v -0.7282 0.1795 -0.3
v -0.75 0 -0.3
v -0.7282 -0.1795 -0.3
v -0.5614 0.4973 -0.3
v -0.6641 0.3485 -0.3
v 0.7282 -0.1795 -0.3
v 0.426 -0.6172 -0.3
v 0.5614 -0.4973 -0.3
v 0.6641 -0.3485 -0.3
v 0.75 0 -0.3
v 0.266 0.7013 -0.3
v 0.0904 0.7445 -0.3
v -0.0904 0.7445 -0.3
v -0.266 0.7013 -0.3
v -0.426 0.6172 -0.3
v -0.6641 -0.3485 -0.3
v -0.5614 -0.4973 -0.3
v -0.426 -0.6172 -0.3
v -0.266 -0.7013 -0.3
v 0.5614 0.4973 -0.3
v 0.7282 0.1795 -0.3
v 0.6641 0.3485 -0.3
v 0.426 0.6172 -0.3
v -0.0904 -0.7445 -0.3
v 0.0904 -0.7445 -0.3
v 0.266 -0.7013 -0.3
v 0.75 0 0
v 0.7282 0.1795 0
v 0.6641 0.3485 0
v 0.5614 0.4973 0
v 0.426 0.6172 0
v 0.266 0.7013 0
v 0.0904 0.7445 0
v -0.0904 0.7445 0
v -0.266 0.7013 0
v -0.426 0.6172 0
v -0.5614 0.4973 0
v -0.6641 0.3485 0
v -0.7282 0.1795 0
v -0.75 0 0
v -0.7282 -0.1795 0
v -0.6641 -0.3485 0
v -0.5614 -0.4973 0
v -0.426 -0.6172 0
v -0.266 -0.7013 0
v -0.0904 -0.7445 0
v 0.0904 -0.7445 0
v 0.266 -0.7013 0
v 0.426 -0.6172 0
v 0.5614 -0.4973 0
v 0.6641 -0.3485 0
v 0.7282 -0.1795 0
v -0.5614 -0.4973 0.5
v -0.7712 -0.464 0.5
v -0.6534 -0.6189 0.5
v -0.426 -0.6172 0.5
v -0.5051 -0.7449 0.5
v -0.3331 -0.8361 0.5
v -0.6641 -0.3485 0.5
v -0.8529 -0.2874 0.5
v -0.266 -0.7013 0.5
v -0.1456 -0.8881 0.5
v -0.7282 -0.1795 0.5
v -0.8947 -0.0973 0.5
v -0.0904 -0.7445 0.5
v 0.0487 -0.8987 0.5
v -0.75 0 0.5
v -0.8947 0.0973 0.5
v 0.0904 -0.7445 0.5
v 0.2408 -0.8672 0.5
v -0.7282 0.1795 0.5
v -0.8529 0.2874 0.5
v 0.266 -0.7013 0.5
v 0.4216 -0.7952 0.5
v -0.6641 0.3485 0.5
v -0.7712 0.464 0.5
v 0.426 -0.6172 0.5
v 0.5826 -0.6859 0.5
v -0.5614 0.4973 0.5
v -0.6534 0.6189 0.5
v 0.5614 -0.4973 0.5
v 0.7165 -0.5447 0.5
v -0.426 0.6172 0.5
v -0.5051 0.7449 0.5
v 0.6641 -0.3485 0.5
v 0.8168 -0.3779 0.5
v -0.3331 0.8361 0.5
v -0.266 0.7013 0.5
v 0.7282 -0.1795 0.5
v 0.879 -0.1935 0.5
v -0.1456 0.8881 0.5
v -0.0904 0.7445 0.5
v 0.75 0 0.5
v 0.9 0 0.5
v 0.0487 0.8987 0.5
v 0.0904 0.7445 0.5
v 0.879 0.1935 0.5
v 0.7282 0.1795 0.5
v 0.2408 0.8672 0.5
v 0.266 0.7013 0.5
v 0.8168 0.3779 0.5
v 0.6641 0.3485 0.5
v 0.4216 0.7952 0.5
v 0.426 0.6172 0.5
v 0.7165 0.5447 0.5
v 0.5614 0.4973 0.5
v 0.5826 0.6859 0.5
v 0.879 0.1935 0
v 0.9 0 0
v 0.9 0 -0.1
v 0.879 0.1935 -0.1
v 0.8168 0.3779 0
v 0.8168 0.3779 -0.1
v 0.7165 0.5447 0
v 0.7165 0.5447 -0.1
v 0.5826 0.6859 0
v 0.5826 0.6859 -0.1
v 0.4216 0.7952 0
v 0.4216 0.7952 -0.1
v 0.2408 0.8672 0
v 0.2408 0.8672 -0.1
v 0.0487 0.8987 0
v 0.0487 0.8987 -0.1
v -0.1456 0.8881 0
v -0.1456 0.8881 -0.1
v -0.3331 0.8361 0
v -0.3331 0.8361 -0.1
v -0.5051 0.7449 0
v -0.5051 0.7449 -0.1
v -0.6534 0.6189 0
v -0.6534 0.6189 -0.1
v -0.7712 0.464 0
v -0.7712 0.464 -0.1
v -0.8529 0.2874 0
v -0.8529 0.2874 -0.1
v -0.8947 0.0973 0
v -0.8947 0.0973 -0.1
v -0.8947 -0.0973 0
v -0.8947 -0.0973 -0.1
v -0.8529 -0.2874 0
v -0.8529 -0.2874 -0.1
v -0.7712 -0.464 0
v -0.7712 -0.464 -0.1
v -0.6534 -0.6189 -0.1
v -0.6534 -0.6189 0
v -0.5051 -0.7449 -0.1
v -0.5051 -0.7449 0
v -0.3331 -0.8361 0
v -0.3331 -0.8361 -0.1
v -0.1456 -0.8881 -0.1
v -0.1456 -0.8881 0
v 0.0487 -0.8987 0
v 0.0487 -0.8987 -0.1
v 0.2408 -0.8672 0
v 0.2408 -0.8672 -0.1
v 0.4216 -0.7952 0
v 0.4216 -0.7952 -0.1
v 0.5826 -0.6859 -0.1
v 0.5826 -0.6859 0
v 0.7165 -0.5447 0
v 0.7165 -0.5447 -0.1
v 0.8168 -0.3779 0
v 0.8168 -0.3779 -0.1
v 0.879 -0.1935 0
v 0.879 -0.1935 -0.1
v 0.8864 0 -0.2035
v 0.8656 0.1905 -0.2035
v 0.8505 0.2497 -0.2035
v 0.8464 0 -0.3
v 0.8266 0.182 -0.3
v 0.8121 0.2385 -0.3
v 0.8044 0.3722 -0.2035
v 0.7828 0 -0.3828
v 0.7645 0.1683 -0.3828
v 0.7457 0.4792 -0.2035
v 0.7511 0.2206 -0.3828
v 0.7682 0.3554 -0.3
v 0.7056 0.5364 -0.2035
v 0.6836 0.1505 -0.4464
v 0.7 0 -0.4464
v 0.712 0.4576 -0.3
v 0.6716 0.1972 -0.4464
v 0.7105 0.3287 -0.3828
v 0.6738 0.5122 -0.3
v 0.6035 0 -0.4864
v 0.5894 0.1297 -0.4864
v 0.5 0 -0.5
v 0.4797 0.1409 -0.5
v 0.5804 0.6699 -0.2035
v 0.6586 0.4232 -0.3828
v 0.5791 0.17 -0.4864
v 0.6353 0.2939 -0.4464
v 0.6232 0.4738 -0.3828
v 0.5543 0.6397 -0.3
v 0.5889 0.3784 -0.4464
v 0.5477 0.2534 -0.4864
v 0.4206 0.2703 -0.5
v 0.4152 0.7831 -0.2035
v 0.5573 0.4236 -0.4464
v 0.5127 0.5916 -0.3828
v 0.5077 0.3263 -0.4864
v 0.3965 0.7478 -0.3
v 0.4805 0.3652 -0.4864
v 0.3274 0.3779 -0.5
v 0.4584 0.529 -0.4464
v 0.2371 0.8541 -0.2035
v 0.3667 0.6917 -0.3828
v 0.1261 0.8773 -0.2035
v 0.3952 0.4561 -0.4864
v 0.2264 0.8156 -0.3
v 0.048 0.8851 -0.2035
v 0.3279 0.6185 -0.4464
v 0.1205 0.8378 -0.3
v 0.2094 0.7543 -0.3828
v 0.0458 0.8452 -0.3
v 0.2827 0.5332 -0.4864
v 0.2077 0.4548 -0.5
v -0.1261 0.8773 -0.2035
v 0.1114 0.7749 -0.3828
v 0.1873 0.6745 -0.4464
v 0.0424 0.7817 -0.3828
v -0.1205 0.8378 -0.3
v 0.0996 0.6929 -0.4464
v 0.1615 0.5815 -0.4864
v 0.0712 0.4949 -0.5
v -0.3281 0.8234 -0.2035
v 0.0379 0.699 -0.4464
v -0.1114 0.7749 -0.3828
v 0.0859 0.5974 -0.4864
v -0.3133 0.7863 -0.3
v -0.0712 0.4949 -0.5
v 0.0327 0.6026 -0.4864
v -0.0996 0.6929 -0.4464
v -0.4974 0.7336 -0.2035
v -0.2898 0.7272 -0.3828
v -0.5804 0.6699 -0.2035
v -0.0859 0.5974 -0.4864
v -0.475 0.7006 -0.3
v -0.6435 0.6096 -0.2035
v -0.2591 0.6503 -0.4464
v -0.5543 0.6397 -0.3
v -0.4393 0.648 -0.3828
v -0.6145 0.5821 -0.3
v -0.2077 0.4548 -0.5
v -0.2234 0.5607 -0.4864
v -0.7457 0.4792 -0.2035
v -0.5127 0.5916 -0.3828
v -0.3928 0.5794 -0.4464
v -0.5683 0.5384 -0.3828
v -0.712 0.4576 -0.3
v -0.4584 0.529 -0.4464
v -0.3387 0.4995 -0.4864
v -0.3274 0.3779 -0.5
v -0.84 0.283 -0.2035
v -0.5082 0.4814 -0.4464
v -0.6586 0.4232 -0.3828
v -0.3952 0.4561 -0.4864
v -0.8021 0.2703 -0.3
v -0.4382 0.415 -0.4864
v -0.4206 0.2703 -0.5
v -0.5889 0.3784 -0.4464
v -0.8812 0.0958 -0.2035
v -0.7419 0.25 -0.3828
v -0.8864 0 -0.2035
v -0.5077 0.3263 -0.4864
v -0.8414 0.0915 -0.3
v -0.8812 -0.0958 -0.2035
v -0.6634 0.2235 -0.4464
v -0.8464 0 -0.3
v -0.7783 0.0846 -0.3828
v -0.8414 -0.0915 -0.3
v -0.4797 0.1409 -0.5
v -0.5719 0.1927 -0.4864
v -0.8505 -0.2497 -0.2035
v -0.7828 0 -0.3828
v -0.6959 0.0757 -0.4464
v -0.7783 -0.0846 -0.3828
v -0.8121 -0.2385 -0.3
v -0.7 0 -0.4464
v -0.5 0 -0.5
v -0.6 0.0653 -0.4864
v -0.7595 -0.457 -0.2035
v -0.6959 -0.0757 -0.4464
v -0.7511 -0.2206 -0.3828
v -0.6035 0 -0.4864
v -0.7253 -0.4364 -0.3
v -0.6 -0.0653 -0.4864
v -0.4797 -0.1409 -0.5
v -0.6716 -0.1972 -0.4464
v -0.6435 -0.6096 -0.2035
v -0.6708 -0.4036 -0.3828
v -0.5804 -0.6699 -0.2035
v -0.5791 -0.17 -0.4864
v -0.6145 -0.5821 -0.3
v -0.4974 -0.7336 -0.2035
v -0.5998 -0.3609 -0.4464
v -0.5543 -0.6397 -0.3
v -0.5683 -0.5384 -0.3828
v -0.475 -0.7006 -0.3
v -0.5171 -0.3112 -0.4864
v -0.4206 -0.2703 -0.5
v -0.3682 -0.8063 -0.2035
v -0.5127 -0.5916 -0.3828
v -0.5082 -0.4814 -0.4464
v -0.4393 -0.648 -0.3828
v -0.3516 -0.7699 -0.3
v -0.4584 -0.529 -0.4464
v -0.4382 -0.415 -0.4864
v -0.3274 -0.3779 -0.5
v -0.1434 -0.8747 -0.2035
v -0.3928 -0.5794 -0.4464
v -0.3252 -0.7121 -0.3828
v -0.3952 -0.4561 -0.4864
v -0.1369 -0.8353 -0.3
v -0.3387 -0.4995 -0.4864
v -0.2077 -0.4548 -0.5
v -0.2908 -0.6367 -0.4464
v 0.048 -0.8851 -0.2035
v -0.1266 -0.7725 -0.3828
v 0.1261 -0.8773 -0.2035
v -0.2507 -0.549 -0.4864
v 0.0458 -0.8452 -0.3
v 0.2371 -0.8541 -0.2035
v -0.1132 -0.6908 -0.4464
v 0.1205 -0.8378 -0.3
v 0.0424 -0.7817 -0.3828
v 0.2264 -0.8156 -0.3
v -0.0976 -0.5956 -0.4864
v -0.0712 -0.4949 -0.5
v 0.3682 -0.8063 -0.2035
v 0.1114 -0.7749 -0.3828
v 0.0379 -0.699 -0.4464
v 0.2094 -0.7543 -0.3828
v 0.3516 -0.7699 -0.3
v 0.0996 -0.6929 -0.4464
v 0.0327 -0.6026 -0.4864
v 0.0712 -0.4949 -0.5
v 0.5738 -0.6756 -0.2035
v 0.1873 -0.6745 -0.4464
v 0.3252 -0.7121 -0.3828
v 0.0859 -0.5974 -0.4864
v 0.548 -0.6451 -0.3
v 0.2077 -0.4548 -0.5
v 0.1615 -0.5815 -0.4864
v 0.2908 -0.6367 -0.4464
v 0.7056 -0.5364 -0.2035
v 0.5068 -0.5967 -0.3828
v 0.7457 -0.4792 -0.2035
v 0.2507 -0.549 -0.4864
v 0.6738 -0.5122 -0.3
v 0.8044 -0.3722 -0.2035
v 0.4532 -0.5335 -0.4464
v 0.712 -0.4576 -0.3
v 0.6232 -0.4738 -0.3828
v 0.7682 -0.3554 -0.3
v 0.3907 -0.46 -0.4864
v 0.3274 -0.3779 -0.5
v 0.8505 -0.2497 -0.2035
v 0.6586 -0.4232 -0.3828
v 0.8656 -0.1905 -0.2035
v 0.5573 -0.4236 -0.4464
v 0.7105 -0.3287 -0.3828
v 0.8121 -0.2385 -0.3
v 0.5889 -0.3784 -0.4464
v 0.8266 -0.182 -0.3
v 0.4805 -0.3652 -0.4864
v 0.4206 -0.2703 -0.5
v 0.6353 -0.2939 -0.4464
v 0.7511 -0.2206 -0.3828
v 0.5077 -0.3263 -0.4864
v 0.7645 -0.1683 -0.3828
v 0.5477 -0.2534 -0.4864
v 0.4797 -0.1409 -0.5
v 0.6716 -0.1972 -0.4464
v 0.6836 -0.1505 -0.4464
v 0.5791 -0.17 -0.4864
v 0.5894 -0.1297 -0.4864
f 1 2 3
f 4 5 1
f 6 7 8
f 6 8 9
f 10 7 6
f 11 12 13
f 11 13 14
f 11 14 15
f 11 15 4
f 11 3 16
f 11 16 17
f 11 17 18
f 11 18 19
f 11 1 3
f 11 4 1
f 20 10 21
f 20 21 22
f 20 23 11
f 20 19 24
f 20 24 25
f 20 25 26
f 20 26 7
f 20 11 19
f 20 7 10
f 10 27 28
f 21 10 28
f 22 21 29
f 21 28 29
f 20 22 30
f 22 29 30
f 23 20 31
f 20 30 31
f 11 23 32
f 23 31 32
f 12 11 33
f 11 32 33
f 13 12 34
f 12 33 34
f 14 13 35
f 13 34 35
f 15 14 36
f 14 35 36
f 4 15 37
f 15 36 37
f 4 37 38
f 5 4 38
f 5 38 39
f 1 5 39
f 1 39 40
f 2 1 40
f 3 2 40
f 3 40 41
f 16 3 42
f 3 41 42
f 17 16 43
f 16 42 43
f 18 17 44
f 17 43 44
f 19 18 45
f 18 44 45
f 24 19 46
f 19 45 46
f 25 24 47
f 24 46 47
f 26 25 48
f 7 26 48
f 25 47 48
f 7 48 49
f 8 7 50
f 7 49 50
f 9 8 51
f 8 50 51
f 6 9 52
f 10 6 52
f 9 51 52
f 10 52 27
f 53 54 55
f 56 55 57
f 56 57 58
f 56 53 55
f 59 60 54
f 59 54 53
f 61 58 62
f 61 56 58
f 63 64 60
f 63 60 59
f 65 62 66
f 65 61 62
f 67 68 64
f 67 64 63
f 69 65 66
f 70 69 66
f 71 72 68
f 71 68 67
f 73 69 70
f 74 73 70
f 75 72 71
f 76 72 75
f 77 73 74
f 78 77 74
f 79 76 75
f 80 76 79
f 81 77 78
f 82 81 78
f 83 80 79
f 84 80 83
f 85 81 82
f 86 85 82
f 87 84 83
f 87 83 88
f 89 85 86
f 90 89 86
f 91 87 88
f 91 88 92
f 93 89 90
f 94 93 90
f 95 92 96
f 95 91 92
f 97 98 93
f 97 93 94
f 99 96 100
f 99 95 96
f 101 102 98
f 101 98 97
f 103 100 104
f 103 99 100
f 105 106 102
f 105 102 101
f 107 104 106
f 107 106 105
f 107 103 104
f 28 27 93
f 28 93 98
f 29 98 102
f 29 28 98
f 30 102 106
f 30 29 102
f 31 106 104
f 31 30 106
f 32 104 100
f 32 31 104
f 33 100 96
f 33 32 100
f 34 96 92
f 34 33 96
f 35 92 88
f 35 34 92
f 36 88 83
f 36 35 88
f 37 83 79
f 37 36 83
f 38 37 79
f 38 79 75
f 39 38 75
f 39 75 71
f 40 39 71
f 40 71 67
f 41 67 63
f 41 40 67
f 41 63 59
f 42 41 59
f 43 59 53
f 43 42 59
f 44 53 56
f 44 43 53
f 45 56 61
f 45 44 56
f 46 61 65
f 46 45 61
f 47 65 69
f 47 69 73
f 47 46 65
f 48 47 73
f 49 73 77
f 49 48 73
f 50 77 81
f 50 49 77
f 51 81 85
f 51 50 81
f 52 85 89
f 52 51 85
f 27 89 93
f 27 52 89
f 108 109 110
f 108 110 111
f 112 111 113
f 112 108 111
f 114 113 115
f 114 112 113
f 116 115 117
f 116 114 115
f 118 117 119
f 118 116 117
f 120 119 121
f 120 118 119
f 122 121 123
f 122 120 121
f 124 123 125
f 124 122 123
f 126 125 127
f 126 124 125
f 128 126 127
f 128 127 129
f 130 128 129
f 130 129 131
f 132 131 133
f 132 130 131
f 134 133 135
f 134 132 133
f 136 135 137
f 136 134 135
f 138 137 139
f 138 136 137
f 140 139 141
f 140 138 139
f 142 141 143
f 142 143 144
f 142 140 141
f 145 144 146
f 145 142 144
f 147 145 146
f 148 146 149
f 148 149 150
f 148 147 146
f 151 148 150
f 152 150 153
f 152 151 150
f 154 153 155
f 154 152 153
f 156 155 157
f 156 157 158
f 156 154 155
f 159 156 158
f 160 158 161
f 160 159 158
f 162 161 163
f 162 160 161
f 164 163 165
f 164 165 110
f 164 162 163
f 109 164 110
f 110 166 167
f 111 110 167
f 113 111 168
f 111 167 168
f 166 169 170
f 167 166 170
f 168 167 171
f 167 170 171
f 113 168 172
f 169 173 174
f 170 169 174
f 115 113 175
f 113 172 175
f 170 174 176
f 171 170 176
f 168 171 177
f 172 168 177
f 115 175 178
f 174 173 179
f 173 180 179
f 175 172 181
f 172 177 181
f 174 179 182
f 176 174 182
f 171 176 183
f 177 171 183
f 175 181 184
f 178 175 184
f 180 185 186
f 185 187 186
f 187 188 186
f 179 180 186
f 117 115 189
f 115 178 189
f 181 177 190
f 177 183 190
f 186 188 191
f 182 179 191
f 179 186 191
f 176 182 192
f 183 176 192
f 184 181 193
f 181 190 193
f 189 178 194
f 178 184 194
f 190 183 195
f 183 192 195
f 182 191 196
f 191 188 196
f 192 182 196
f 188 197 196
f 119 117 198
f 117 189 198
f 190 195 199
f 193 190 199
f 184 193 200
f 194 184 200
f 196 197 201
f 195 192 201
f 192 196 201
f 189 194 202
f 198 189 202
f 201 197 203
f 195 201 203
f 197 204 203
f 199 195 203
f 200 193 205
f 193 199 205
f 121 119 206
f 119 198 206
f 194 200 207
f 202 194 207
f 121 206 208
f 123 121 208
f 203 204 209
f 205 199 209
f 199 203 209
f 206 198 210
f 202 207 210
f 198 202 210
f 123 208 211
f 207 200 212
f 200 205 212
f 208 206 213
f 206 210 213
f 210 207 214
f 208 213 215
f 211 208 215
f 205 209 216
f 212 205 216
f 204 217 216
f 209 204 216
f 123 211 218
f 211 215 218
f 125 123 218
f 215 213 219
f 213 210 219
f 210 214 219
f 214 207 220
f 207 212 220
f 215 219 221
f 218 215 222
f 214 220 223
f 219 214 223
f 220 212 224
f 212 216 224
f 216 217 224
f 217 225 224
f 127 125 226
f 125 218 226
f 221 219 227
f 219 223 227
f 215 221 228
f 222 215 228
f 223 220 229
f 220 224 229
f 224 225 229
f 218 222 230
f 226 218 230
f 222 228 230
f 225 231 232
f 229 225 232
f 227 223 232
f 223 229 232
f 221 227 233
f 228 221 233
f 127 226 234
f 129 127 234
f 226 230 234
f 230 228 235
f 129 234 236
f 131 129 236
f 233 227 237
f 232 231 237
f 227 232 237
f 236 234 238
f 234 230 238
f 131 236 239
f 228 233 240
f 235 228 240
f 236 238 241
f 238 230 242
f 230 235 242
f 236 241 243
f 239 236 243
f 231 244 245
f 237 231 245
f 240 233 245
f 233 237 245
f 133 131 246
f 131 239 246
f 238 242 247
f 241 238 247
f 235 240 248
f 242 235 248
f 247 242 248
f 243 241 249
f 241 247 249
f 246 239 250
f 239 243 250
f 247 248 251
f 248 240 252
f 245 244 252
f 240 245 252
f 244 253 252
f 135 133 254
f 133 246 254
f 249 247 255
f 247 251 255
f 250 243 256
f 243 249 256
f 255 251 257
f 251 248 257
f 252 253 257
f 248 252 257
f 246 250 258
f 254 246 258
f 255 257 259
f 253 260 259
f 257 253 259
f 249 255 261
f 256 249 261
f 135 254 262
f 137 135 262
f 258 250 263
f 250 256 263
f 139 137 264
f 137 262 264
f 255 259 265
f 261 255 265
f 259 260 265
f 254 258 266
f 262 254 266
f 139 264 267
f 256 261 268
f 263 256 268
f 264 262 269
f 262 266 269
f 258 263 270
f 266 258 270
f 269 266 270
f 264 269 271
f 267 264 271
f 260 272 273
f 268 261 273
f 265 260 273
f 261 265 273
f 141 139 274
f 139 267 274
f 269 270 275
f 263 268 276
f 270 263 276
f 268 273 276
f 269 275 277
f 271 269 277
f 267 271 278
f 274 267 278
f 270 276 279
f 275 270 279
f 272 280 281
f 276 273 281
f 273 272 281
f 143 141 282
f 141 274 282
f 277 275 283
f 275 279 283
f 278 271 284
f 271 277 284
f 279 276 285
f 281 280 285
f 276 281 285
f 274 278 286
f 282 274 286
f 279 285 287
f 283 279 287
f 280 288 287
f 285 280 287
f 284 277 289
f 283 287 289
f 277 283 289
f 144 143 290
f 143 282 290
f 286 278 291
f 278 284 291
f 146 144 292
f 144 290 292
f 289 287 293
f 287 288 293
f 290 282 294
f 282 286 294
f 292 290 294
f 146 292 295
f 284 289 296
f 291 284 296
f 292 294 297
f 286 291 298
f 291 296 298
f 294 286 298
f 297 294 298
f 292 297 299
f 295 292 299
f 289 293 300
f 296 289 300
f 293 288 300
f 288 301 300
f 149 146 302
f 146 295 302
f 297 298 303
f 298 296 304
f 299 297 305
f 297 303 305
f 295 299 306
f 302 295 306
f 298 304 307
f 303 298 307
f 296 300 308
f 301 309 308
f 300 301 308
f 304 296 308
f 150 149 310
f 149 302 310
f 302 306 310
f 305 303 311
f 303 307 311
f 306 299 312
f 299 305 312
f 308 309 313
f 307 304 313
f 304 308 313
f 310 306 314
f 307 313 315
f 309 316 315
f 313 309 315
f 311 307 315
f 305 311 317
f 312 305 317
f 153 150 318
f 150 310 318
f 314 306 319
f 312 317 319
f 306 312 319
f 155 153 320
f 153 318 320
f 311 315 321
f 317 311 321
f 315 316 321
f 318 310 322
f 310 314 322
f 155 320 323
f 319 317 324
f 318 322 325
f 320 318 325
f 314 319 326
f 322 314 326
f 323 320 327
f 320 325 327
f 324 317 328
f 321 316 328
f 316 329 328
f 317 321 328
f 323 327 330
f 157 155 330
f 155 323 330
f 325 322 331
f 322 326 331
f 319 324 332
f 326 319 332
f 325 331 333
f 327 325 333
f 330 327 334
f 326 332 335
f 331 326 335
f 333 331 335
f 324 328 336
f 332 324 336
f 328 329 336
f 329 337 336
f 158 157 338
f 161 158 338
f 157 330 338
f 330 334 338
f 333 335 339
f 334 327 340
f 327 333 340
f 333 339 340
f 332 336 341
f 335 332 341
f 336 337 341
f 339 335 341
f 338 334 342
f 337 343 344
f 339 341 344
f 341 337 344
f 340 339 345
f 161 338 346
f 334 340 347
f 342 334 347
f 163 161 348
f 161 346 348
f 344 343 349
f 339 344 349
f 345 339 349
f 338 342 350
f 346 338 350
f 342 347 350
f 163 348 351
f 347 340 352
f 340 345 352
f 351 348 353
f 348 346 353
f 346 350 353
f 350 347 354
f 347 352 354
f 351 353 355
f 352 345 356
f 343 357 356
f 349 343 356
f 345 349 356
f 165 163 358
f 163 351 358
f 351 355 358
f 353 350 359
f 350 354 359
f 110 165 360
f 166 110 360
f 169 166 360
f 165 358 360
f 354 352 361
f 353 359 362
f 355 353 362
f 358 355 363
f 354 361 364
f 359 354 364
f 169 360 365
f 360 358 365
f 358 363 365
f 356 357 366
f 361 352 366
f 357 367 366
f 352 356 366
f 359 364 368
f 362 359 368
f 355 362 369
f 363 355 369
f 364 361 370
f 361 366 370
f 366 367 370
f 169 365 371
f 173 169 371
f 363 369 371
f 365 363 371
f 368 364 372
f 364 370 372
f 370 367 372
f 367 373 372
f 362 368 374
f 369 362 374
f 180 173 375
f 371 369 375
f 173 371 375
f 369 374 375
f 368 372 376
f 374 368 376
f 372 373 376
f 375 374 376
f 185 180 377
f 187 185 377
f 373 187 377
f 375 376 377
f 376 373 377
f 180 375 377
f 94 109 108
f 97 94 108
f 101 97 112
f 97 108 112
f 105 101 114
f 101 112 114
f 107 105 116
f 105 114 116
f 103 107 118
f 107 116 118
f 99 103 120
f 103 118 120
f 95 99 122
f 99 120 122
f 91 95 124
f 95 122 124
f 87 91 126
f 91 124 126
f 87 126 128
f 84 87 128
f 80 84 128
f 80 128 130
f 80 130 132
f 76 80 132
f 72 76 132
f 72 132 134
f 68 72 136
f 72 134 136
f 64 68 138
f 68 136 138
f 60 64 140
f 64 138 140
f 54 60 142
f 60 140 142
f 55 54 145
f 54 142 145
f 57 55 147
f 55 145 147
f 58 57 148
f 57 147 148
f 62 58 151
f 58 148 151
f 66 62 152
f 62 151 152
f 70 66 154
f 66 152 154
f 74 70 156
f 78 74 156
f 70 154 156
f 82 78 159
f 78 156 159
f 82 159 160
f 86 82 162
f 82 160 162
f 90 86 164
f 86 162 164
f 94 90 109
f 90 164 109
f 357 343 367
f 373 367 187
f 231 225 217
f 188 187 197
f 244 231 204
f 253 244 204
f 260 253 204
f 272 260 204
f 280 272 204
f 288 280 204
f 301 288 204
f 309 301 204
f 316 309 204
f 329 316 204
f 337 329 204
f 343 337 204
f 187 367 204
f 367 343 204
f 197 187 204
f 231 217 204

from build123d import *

# Parameters (mm, degrees)
SKETCH1_R           = 0.9
BOSS_EXTRUDE1_DEPTH = 0.5
FILLET1_R           = 0.4
SKETCH2_R           = 0.75
CUT_EXTRUDE1_DEPTH  = 0.3
SKETCH3_R           = 0.9
SKETCH3_R_2         = 0.75
BOSS_EXTRUDE3_DEPTH = 0.5


with BuildPart() as part:
    # Sketch1 → Boss-Extrude1 (new body)
    with BuildSketch(Plane.XY):
        Circle(SKETCH1_R)
    extrude(amount=-BOSS_EXTRUDE1_DEPTH)

    # Fillet1
    fillet1_edges = [part.edges().sort_by_distance(p)[0] for p in [
        (-0.9, 0, -0.5),
    ]]
    fillet(fillet1_edges, radius=FILLET1_R)

    # Sketch2 → Cut-Extrude1 (cut)
    with BuildSketch(Plane.XY):
        Circle(SKETCH2_R)
    extrude(amount=-CUT_EXTRUDE1_DEPTH, mode=Mode.SUBTRACT)

    # Sketch3 → Boss-Extrude3 (add)
    with BuildSketch(Plane.XY):
        Circle(SKETCH3_R)
        Circle(SKETCH3_R_2, mode=Mode.SUBTRACT)
    extrude(amount=BOSS_EXTRUDE3_DEPTH)


solid = part.part
